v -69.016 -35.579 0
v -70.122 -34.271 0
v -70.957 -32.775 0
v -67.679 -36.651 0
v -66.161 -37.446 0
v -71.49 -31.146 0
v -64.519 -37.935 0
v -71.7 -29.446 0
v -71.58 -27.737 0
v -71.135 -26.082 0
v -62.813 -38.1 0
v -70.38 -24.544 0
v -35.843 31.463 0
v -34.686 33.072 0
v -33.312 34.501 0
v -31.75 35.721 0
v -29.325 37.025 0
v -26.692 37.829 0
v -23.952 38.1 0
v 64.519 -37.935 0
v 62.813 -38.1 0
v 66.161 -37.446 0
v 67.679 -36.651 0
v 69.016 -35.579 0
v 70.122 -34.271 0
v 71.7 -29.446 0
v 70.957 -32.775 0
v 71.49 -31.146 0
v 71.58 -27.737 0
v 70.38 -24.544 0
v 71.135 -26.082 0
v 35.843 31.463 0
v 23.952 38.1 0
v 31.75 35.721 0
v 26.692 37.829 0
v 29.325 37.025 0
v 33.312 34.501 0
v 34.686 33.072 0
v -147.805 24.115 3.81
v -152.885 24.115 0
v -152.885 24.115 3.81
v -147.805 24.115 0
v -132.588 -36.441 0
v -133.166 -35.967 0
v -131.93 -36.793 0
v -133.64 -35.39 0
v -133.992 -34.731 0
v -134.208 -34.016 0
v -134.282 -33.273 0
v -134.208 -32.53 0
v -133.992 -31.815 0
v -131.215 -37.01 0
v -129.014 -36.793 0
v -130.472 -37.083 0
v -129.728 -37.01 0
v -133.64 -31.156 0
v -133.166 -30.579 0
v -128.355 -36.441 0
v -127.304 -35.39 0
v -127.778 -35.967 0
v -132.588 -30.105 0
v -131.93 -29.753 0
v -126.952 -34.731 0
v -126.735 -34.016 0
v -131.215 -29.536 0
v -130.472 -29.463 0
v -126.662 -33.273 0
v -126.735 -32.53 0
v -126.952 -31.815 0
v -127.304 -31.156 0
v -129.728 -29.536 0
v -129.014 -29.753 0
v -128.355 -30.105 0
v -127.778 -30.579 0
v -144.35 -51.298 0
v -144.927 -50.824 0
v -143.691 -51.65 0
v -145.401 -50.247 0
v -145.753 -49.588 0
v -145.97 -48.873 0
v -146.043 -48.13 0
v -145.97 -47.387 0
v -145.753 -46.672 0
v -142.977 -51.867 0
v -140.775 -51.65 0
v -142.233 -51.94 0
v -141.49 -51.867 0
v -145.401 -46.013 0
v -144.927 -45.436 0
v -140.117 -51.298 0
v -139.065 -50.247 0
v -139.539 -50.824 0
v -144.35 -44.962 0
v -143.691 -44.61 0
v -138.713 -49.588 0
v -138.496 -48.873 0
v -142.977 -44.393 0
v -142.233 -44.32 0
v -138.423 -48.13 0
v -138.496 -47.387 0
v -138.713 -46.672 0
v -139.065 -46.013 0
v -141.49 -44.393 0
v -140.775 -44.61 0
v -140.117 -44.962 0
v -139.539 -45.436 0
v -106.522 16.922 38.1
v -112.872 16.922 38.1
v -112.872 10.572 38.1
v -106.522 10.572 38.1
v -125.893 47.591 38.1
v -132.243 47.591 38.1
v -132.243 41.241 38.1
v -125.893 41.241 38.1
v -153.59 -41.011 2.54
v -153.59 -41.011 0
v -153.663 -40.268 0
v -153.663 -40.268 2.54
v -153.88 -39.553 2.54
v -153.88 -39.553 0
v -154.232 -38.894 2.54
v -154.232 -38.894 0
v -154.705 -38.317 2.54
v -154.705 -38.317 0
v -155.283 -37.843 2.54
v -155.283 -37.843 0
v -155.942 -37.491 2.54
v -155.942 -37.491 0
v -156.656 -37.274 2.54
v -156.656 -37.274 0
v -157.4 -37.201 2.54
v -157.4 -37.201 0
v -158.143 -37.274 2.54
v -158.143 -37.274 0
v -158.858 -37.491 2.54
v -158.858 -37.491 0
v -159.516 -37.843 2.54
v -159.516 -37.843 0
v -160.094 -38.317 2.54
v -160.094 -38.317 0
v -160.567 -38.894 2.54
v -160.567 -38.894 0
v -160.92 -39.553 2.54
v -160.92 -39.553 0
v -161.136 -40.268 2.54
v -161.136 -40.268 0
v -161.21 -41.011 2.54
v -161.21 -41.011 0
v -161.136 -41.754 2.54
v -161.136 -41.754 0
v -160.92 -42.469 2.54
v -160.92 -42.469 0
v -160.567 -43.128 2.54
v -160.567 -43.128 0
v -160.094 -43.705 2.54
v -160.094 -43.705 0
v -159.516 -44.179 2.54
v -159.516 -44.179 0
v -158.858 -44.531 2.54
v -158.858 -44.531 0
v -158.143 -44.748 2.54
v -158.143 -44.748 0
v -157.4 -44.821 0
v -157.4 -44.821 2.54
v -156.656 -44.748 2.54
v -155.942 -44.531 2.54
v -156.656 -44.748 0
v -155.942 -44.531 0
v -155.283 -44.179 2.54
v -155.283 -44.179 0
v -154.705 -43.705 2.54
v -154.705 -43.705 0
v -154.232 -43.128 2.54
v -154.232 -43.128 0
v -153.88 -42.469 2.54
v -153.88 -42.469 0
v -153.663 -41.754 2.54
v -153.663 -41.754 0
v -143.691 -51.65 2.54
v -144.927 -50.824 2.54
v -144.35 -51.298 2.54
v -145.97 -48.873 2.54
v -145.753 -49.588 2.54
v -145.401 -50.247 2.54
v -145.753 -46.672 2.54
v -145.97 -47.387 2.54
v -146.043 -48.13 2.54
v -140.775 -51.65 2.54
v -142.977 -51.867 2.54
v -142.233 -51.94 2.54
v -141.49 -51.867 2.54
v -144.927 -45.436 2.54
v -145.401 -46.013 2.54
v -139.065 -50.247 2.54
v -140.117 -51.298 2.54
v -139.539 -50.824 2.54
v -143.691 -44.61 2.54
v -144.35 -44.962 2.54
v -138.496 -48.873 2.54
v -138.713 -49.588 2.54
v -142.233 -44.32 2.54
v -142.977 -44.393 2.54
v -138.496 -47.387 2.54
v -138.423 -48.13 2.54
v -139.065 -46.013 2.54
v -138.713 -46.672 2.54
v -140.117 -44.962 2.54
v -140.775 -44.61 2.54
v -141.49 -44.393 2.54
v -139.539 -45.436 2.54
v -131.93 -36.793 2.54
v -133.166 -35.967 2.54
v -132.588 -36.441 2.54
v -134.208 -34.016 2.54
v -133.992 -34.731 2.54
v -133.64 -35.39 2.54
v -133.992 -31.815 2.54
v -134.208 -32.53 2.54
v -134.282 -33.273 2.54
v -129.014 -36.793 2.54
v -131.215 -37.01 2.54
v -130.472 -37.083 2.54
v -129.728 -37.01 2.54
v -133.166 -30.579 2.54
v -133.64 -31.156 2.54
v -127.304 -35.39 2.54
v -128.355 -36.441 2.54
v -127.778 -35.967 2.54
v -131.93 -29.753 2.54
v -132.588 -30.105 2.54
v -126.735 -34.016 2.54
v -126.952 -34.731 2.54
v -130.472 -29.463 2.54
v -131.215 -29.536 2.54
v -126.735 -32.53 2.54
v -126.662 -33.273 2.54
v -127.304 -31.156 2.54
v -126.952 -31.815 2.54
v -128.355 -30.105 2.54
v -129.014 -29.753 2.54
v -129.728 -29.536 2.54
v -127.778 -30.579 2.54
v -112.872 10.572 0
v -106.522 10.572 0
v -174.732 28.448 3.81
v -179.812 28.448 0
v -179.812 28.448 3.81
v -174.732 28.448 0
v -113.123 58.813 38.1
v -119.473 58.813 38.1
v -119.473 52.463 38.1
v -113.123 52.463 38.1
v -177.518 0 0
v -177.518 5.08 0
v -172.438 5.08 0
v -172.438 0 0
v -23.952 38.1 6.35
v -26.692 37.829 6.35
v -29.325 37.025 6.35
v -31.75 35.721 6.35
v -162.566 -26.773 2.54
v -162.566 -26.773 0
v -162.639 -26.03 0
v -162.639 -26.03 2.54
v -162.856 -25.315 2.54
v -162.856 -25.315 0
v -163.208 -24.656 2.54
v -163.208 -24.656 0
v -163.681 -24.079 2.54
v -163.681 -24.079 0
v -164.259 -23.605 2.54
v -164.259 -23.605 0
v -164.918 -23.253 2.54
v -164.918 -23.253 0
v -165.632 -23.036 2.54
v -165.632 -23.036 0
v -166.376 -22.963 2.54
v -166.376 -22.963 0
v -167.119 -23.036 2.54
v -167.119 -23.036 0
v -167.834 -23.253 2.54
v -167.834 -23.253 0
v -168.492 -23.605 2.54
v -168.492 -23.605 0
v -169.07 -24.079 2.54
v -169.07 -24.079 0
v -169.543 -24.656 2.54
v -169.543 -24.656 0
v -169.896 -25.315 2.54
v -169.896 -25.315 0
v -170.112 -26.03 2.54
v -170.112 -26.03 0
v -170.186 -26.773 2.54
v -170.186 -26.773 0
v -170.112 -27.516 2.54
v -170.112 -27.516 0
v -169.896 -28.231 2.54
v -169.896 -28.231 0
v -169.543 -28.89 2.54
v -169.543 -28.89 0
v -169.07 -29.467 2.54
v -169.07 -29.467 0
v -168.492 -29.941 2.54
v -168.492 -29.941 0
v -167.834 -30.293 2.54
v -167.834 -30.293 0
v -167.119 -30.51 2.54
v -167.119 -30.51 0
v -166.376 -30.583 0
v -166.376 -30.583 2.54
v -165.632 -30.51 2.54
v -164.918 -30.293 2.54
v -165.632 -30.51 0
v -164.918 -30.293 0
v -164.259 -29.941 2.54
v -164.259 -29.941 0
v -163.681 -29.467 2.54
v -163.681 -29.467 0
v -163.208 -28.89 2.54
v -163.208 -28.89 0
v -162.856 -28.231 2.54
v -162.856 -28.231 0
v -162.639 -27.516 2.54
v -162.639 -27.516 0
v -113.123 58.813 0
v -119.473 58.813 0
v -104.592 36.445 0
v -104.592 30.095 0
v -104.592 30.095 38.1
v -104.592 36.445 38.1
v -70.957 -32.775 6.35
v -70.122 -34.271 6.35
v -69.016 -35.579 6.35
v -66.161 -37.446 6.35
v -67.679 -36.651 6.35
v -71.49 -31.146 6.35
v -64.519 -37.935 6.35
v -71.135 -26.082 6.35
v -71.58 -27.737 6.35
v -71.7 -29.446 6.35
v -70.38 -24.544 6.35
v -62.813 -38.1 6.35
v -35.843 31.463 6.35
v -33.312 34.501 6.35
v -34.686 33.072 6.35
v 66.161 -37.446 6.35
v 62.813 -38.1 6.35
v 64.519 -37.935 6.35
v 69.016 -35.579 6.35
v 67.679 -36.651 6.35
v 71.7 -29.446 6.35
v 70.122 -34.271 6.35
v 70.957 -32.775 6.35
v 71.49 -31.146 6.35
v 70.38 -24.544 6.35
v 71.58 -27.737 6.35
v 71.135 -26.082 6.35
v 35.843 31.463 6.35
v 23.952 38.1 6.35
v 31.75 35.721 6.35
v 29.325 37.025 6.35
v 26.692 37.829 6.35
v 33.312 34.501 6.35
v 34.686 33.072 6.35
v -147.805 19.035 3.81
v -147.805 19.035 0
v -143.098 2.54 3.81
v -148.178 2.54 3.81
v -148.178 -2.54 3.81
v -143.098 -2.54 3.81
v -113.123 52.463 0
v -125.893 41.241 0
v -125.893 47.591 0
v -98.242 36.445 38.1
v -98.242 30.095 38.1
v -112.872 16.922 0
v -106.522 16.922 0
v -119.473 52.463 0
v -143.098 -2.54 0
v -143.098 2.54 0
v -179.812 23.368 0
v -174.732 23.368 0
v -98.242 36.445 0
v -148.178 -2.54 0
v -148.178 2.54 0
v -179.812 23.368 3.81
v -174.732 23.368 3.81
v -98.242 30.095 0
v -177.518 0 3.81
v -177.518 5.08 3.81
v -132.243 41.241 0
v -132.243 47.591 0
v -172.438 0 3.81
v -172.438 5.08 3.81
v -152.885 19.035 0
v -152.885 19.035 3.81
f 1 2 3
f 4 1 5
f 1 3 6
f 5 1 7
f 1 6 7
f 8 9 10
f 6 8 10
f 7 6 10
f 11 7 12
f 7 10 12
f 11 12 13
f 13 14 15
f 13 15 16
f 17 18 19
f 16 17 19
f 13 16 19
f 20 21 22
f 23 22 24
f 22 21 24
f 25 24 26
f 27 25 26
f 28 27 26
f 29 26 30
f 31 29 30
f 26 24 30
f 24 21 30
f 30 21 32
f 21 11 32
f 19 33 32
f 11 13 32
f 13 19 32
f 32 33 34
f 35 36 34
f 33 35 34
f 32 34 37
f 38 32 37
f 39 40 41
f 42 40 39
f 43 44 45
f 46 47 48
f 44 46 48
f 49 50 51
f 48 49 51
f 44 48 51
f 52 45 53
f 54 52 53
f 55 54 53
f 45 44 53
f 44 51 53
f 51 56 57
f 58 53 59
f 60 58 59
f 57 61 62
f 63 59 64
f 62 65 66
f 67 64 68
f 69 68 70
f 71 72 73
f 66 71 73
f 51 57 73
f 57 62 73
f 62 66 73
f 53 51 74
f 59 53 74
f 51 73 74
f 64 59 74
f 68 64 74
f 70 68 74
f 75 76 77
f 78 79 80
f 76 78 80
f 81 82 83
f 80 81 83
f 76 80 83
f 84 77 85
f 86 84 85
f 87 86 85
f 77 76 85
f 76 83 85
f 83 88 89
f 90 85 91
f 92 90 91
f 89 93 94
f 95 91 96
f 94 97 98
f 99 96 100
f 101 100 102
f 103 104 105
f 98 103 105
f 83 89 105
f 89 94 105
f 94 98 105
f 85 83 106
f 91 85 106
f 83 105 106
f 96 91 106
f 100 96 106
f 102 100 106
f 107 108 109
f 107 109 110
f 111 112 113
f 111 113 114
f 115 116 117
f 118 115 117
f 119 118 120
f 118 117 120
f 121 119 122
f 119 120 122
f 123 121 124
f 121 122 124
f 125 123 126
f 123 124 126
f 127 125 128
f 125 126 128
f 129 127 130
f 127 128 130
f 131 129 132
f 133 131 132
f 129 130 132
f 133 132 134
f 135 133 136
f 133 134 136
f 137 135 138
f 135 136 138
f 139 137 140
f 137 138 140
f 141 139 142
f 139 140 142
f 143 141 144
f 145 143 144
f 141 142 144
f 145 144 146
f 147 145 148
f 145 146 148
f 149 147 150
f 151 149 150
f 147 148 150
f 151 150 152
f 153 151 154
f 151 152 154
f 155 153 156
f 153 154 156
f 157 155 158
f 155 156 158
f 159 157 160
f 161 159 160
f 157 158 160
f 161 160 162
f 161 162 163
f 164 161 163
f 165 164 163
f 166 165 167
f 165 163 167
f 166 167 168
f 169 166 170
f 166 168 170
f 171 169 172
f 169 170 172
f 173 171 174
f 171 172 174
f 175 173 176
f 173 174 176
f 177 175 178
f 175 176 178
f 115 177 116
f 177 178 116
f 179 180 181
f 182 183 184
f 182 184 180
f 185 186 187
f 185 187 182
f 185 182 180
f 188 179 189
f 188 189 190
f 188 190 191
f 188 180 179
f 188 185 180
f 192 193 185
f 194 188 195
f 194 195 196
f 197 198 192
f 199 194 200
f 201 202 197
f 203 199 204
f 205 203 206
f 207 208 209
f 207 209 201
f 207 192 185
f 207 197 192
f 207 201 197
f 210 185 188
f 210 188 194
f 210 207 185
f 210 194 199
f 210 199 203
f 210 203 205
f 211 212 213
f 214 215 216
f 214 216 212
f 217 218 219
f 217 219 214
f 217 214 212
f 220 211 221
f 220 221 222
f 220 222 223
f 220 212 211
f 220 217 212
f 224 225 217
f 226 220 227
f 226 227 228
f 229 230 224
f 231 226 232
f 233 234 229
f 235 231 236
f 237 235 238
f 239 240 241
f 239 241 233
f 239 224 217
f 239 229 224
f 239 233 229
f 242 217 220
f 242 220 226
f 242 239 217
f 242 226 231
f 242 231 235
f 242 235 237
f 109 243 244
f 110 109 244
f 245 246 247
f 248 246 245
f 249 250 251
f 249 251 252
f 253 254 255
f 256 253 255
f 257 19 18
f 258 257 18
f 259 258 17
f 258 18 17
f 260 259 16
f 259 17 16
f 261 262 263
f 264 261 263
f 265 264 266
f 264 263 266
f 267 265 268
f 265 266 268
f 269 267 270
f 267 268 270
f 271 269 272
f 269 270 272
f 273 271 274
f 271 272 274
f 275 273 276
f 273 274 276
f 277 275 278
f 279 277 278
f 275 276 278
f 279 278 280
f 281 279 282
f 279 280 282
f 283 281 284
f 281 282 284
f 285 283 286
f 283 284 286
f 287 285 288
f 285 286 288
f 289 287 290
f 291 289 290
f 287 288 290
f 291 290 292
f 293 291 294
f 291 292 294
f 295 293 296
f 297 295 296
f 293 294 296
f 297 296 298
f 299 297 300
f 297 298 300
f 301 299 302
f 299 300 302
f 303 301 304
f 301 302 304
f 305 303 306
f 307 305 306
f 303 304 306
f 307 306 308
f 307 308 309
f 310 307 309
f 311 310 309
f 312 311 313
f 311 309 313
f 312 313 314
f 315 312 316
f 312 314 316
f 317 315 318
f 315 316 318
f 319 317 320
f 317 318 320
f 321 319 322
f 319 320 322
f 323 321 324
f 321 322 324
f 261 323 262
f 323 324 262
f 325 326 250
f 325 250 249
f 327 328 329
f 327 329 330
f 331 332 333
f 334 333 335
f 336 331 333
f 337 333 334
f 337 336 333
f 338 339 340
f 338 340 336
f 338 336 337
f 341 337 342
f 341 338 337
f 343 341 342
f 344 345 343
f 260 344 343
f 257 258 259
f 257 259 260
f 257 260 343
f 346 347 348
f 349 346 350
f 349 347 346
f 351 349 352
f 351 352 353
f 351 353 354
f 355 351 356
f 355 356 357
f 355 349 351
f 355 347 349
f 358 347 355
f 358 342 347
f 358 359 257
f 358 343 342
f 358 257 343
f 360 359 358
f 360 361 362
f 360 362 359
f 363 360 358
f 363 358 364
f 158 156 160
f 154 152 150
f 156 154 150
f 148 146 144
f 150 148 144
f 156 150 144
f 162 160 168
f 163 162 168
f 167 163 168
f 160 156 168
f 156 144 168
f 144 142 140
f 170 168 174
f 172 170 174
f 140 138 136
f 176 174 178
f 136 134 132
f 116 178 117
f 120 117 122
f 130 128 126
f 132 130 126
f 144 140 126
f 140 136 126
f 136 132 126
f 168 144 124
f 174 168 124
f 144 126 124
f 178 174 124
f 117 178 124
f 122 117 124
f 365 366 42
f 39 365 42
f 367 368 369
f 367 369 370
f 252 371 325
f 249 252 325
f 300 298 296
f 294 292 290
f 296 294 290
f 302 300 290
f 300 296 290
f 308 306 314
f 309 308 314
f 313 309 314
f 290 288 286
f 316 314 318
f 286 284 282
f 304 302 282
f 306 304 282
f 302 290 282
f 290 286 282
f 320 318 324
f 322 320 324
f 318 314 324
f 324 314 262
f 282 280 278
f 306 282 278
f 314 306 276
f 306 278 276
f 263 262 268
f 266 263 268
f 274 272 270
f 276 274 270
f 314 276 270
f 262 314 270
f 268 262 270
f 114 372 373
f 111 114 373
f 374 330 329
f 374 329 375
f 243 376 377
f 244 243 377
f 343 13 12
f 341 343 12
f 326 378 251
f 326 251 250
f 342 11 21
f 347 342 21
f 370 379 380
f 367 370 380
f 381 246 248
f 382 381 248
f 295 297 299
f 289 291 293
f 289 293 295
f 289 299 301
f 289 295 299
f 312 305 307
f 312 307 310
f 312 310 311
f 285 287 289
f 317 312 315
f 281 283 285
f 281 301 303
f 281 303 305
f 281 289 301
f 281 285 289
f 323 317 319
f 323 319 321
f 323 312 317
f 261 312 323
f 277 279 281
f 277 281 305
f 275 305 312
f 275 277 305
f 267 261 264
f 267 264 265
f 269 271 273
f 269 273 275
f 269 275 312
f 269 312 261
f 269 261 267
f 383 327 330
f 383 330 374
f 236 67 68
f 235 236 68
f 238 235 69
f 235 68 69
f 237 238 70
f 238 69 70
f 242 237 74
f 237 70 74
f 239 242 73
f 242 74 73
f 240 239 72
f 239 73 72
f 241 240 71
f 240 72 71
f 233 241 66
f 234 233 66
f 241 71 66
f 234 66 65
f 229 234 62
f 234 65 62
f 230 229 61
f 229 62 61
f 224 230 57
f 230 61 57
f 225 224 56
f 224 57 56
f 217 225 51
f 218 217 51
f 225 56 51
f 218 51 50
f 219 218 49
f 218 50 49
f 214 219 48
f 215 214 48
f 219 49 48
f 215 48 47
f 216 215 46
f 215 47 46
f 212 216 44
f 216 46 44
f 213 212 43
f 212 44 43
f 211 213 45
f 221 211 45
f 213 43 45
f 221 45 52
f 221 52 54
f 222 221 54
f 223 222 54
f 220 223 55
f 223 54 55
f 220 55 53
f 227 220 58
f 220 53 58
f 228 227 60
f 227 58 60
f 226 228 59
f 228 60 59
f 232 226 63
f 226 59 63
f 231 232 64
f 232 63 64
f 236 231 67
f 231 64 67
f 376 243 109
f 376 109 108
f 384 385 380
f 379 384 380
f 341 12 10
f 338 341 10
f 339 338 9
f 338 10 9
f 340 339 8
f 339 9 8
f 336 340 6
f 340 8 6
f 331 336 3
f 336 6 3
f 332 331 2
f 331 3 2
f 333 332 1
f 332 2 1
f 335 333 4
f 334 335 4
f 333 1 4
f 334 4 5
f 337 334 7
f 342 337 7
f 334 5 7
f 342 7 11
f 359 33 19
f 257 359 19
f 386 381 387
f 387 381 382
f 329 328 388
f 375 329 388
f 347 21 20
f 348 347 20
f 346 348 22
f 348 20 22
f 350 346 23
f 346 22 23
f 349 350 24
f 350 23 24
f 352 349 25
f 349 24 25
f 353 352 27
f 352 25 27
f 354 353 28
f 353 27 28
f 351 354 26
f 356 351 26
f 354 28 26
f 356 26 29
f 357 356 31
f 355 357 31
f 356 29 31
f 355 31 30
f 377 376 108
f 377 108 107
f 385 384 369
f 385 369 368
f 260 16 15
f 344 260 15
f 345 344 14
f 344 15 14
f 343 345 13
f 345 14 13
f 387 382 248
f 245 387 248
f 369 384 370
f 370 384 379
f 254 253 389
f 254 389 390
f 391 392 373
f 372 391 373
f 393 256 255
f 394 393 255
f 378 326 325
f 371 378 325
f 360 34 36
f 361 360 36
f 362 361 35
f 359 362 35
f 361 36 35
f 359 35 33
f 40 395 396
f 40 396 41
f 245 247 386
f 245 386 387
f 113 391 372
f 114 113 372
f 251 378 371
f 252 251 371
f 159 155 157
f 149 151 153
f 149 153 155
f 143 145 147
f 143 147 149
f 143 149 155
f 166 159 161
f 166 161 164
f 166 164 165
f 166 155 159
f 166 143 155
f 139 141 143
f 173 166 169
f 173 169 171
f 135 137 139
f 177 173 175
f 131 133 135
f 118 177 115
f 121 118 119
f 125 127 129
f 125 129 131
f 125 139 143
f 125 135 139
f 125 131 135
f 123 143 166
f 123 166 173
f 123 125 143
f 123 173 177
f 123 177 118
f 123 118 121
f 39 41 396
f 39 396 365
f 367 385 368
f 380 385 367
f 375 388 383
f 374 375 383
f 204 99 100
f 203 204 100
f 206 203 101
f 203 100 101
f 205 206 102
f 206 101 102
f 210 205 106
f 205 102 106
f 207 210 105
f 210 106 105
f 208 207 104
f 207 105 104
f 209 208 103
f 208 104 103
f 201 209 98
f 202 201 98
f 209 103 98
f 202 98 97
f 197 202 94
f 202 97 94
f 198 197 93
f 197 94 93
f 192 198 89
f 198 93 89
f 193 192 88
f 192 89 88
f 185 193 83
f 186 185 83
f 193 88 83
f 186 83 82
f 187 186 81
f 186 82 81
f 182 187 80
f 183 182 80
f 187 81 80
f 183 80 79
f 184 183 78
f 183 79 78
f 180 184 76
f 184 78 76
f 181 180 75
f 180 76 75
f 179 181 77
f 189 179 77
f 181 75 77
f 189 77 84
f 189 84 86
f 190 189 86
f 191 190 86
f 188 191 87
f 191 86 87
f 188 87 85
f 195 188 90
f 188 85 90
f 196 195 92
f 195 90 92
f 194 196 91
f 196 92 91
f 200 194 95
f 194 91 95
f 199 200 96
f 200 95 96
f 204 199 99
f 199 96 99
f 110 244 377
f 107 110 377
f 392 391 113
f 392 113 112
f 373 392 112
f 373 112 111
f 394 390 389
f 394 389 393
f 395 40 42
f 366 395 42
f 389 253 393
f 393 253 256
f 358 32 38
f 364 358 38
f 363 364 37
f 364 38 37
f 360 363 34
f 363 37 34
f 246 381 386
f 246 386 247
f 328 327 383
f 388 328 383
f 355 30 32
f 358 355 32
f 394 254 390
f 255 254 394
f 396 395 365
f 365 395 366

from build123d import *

# Parameters (mm, degrees)
F1_DEPTH = 6.35
F2_W     = 6.35
F2_H     = 6.35
F3_DEPTH = 38.1
F4_W     = 5.08
F4_H     = 5.08
F5_DEPTH = 3.81
F6_R     = 3.81
F7_DEPTH = 2.54


with BuildPart() as f1:
    # F0 (on Top) → F1 (new body)
    with BuildSketch(Plane.XY):
        with BuildLine():
            Line((-31.75, -38.1), (-31.75, 35.721134))
            ThreePointArc((-31.75, 35.721134), (-34.024133, 33.810703), (-35.843005, 31.462695))
            Line((-35.843005, 31.462695), (-70.380306, -24.543739))
            ThreePointArc((-70.380306, -24.543739), (-70.575972, -33.542958), (-62.813397, -38.1))
            Line((-62.813397, -38.1), (-31.75, -38.1))
        make_face()
        with BuildLine():
            Line((23.952148, 38.1), (-23.952148, 38.1))
            ThreePointArc((-23.952148, 38.1), (-28.028467, 37.492055), (-31.75, 35.721134))
            Line((-31.75, 35.721134), (-31.75, -38.1))
            Line((-31.75, -38.1), (31.75, -38.1))
            Line((31.75, -38.1), (31.75, 35.721134))
            ThreePointArc((31.75, 35.721134), (28.028467, 37.492055), (23.952148, 38.1))
        make_face()
        with BuildLine():
            ThreePointArc((35.843005, 31.462695), (34.024133, 33.810703), (31.75, 35.721134))
            Line((31.75, 35.721134), (31.75, -38.1))
            Line((31.75, -38.1), (62.813397, -38.1))
            ThreePointArc((62.813397, -38.1), (70.575972, -33.542958), (70.380306, -24.543739))
            Line((70.380306, -24.543739), (35.843005, 31.462695))
        make_face()
    extrude(amount=F1_DEPTH)


with BuildPart() as f3:
    # F2 (on Top) → F3 (new body)
    with BuildSketch(Plane.XY):
        with Locations((-116.298353, 55.638036)):
            Rectangle(F2_W, F2_H)
        with Locations((-109.697118, 13.74724)):
            Rectangle(F2_W, F2_H)
        with Locations((-101.416707, 33.269715)):
            Rectangle(F2_W, F2_H)
        with Locations((-129.06836, 44.415608)):
            Rectangle(F2_W, F2_H)
    extrude(amount=F3_DEPTH)


with BuildPart() as f5:
    # F4 (on Top) → F5 (new body)
    with BuildSketch(Plane.XY):
        with Locations((-177.272476, 25.908493)):
            Rectangle(F4_W, F4_H)
        with Locations((-174.978114, 2.54)):
            Rectangle(F4_W, F4_H)
        with Locations((-145.637929, 0)):
            Rectangle(F4_W, F4_H)
        with Locations((-150.344558, 21.575261)):
            Rectangle(F4_W, F4_H)
    extrude(amount=F5_DEPTH)


with BuildPart() as f7:
    # F6 (on Top) → F7 (new body)
    with BuildSketch(Plane.XY):
        with Locations((-166.375533, -26.773173)):
            Circle(F6_R)
        with Locations((-142.233253, -48.129804)):
            Circle(F6_R)
        with Locations((-157.399565, -41.010927)):
            Circle(F6_R)
        with Locations((-130.471632, -33.273019)):
            Circle(F6_R)
    extrude(amount=F7_DEPTH)


solid = Compound([f1.part, f3.part, f5.part, f7.part])
